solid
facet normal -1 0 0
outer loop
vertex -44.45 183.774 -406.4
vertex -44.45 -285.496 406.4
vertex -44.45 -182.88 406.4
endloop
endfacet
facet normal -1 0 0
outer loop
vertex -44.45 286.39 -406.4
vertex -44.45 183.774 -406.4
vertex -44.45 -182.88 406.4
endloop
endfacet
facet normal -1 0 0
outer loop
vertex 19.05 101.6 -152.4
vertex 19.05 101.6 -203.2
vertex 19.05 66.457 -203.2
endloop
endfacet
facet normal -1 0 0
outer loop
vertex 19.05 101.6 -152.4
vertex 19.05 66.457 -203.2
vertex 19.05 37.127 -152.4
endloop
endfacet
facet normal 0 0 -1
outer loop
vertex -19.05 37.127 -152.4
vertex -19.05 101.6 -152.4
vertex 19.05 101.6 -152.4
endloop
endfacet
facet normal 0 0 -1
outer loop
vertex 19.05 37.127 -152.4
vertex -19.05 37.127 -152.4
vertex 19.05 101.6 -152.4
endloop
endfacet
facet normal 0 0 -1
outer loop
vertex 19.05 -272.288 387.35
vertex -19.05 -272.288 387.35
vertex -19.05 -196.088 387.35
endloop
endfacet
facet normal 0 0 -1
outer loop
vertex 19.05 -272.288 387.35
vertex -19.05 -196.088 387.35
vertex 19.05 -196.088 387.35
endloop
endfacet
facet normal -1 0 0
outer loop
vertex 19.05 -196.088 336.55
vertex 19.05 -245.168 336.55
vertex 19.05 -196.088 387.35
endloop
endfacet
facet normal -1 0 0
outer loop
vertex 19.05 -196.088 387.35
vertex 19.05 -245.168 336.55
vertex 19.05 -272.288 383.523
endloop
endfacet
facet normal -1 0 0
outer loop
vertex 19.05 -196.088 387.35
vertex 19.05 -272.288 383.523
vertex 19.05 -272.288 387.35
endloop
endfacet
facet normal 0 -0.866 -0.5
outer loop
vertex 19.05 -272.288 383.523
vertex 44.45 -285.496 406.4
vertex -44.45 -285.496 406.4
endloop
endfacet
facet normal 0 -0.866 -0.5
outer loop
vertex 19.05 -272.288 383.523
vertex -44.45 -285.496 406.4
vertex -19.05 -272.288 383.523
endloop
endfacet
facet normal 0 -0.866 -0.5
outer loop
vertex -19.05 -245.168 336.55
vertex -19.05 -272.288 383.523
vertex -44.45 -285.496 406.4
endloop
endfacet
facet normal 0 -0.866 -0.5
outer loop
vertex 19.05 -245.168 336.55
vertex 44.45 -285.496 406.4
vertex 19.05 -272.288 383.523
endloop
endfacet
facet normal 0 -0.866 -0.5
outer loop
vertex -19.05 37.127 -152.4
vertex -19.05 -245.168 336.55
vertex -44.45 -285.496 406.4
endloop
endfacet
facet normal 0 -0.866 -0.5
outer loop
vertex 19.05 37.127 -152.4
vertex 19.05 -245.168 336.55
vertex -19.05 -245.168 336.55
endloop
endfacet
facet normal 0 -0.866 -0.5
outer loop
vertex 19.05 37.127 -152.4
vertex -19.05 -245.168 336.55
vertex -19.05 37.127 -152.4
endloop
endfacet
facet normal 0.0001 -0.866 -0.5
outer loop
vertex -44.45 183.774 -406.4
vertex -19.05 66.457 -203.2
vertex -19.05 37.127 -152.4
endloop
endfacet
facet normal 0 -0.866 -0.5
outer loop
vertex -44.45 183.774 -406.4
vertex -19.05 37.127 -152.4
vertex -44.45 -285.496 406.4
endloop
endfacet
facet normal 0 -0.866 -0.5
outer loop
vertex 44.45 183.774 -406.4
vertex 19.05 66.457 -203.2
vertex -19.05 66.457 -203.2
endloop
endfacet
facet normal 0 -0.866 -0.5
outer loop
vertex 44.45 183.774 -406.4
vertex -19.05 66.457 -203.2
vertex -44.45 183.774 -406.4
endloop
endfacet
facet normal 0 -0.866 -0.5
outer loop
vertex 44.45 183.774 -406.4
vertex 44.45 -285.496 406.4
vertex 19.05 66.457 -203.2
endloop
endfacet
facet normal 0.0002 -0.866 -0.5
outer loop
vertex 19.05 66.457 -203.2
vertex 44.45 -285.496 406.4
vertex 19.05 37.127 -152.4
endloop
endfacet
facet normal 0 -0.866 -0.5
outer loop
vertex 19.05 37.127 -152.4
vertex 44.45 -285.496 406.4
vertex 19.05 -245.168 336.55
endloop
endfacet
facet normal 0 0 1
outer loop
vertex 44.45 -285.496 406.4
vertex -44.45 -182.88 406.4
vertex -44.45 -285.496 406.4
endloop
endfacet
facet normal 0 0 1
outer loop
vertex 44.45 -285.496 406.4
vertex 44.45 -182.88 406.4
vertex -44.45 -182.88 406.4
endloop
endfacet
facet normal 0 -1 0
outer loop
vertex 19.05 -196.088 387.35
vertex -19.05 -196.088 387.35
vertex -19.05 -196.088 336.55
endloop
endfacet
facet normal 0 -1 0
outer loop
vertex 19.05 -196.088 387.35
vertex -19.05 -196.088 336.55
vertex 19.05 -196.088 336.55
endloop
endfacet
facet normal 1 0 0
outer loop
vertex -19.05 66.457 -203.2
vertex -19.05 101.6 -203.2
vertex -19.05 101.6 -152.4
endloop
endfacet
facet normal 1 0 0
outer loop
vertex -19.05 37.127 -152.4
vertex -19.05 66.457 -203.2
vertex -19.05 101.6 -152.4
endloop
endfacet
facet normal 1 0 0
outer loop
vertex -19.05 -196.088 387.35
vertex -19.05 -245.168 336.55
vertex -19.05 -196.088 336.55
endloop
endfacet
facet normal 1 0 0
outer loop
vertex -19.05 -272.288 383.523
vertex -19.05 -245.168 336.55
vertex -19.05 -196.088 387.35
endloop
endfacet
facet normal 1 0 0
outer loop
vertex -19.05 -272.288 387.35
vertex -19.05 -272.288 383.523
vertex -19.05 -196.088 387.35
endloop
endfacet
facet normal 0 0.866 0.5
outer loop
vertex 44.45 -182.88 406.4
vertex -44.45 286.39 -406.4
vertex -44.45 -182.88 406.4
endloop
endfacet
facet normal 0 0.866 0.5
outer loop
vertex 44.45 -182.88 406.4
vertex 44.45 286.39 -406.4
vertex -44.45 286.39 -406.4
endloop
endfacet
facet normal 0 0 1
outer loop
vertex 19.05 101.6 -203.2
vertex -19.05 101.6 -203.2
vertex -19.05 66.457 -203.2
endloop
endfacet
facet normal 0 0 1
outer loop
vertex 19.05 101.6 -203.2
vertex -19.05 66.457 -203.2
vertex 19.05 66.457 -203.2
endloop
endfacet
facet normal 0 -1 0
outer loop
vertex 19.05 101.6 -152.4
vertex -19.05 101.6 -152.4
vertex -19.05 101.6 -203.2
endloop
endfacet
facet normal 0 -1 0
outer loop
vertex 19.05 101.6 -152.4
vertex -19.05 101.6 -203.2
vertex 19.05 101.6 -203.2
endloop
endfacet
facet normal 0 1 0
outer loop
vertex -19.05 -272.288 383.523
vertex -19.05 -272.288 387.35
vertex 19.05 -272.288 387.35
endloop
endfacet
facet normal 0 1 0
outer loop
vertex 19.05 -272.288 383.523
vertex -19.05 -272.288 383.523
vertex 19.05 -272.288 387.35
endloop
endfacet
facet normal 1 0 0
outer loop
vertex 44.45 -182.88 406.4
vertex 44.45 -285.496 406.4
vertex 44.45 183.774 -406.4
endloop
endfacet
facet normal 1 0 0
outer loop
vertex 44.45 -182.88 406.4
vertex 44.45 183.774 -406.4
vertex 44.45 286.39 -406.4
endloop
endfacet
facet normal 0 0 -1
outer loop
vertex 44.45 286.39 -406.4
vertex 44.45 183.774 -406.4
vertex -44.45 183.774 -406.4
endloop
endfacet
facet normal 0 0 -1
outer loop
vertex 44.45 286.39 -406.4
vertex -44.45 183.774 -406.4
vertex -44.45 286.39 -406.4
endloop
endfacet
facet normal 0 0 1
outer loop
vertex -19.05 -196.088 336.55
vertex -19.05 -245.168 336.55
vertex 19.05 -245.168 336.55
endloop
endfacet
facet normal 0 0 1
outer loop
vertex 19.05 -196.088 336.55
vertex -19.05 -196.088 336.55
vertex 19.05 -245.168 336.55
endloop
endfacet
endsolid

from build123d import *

# Parameters (mm, degrees)
F1_DEPTH = 44.45
F3_W     = 38.1
F3_H     = 50.8
F4_DEPTH = 76.2
F6_W     = 38.1
F6_H     = 50.8
F7_DEPTH = 76.2


with BuildPart() as f1:
    # F0 (on Right) → F1 (new body, symmetric)
    with BuildSketch(Plane.YZ):
        Polygon((-182.88, 406.4), (-285.496, 406.4), (183.774299, -406.4), (286.390299, -406.4), align=None)
    extrude(amount=F1_DEPTH, both=True)

    # F3 (on offset) → F4 (cut)
    with BuildSketch(Plane.XZ.offset(272.288)):
        with Locations((0, 361.95)):
            Rectangle(F3_W, F3_H)
    extrude(amount=-F4_DEPTH, mode=Mode.SUBTRACT)

    # F6 (on offset) → F7 (cut)
    with BuildSketch(Plane.XZ.offset(-101.6)):
        with Locations((0, -177.8)):
            Rectangle(F6_W, F6_H)
    extrude(amount=F7_DEPTH, mode=Mode.SUBTRACT)


solid = f1.part
